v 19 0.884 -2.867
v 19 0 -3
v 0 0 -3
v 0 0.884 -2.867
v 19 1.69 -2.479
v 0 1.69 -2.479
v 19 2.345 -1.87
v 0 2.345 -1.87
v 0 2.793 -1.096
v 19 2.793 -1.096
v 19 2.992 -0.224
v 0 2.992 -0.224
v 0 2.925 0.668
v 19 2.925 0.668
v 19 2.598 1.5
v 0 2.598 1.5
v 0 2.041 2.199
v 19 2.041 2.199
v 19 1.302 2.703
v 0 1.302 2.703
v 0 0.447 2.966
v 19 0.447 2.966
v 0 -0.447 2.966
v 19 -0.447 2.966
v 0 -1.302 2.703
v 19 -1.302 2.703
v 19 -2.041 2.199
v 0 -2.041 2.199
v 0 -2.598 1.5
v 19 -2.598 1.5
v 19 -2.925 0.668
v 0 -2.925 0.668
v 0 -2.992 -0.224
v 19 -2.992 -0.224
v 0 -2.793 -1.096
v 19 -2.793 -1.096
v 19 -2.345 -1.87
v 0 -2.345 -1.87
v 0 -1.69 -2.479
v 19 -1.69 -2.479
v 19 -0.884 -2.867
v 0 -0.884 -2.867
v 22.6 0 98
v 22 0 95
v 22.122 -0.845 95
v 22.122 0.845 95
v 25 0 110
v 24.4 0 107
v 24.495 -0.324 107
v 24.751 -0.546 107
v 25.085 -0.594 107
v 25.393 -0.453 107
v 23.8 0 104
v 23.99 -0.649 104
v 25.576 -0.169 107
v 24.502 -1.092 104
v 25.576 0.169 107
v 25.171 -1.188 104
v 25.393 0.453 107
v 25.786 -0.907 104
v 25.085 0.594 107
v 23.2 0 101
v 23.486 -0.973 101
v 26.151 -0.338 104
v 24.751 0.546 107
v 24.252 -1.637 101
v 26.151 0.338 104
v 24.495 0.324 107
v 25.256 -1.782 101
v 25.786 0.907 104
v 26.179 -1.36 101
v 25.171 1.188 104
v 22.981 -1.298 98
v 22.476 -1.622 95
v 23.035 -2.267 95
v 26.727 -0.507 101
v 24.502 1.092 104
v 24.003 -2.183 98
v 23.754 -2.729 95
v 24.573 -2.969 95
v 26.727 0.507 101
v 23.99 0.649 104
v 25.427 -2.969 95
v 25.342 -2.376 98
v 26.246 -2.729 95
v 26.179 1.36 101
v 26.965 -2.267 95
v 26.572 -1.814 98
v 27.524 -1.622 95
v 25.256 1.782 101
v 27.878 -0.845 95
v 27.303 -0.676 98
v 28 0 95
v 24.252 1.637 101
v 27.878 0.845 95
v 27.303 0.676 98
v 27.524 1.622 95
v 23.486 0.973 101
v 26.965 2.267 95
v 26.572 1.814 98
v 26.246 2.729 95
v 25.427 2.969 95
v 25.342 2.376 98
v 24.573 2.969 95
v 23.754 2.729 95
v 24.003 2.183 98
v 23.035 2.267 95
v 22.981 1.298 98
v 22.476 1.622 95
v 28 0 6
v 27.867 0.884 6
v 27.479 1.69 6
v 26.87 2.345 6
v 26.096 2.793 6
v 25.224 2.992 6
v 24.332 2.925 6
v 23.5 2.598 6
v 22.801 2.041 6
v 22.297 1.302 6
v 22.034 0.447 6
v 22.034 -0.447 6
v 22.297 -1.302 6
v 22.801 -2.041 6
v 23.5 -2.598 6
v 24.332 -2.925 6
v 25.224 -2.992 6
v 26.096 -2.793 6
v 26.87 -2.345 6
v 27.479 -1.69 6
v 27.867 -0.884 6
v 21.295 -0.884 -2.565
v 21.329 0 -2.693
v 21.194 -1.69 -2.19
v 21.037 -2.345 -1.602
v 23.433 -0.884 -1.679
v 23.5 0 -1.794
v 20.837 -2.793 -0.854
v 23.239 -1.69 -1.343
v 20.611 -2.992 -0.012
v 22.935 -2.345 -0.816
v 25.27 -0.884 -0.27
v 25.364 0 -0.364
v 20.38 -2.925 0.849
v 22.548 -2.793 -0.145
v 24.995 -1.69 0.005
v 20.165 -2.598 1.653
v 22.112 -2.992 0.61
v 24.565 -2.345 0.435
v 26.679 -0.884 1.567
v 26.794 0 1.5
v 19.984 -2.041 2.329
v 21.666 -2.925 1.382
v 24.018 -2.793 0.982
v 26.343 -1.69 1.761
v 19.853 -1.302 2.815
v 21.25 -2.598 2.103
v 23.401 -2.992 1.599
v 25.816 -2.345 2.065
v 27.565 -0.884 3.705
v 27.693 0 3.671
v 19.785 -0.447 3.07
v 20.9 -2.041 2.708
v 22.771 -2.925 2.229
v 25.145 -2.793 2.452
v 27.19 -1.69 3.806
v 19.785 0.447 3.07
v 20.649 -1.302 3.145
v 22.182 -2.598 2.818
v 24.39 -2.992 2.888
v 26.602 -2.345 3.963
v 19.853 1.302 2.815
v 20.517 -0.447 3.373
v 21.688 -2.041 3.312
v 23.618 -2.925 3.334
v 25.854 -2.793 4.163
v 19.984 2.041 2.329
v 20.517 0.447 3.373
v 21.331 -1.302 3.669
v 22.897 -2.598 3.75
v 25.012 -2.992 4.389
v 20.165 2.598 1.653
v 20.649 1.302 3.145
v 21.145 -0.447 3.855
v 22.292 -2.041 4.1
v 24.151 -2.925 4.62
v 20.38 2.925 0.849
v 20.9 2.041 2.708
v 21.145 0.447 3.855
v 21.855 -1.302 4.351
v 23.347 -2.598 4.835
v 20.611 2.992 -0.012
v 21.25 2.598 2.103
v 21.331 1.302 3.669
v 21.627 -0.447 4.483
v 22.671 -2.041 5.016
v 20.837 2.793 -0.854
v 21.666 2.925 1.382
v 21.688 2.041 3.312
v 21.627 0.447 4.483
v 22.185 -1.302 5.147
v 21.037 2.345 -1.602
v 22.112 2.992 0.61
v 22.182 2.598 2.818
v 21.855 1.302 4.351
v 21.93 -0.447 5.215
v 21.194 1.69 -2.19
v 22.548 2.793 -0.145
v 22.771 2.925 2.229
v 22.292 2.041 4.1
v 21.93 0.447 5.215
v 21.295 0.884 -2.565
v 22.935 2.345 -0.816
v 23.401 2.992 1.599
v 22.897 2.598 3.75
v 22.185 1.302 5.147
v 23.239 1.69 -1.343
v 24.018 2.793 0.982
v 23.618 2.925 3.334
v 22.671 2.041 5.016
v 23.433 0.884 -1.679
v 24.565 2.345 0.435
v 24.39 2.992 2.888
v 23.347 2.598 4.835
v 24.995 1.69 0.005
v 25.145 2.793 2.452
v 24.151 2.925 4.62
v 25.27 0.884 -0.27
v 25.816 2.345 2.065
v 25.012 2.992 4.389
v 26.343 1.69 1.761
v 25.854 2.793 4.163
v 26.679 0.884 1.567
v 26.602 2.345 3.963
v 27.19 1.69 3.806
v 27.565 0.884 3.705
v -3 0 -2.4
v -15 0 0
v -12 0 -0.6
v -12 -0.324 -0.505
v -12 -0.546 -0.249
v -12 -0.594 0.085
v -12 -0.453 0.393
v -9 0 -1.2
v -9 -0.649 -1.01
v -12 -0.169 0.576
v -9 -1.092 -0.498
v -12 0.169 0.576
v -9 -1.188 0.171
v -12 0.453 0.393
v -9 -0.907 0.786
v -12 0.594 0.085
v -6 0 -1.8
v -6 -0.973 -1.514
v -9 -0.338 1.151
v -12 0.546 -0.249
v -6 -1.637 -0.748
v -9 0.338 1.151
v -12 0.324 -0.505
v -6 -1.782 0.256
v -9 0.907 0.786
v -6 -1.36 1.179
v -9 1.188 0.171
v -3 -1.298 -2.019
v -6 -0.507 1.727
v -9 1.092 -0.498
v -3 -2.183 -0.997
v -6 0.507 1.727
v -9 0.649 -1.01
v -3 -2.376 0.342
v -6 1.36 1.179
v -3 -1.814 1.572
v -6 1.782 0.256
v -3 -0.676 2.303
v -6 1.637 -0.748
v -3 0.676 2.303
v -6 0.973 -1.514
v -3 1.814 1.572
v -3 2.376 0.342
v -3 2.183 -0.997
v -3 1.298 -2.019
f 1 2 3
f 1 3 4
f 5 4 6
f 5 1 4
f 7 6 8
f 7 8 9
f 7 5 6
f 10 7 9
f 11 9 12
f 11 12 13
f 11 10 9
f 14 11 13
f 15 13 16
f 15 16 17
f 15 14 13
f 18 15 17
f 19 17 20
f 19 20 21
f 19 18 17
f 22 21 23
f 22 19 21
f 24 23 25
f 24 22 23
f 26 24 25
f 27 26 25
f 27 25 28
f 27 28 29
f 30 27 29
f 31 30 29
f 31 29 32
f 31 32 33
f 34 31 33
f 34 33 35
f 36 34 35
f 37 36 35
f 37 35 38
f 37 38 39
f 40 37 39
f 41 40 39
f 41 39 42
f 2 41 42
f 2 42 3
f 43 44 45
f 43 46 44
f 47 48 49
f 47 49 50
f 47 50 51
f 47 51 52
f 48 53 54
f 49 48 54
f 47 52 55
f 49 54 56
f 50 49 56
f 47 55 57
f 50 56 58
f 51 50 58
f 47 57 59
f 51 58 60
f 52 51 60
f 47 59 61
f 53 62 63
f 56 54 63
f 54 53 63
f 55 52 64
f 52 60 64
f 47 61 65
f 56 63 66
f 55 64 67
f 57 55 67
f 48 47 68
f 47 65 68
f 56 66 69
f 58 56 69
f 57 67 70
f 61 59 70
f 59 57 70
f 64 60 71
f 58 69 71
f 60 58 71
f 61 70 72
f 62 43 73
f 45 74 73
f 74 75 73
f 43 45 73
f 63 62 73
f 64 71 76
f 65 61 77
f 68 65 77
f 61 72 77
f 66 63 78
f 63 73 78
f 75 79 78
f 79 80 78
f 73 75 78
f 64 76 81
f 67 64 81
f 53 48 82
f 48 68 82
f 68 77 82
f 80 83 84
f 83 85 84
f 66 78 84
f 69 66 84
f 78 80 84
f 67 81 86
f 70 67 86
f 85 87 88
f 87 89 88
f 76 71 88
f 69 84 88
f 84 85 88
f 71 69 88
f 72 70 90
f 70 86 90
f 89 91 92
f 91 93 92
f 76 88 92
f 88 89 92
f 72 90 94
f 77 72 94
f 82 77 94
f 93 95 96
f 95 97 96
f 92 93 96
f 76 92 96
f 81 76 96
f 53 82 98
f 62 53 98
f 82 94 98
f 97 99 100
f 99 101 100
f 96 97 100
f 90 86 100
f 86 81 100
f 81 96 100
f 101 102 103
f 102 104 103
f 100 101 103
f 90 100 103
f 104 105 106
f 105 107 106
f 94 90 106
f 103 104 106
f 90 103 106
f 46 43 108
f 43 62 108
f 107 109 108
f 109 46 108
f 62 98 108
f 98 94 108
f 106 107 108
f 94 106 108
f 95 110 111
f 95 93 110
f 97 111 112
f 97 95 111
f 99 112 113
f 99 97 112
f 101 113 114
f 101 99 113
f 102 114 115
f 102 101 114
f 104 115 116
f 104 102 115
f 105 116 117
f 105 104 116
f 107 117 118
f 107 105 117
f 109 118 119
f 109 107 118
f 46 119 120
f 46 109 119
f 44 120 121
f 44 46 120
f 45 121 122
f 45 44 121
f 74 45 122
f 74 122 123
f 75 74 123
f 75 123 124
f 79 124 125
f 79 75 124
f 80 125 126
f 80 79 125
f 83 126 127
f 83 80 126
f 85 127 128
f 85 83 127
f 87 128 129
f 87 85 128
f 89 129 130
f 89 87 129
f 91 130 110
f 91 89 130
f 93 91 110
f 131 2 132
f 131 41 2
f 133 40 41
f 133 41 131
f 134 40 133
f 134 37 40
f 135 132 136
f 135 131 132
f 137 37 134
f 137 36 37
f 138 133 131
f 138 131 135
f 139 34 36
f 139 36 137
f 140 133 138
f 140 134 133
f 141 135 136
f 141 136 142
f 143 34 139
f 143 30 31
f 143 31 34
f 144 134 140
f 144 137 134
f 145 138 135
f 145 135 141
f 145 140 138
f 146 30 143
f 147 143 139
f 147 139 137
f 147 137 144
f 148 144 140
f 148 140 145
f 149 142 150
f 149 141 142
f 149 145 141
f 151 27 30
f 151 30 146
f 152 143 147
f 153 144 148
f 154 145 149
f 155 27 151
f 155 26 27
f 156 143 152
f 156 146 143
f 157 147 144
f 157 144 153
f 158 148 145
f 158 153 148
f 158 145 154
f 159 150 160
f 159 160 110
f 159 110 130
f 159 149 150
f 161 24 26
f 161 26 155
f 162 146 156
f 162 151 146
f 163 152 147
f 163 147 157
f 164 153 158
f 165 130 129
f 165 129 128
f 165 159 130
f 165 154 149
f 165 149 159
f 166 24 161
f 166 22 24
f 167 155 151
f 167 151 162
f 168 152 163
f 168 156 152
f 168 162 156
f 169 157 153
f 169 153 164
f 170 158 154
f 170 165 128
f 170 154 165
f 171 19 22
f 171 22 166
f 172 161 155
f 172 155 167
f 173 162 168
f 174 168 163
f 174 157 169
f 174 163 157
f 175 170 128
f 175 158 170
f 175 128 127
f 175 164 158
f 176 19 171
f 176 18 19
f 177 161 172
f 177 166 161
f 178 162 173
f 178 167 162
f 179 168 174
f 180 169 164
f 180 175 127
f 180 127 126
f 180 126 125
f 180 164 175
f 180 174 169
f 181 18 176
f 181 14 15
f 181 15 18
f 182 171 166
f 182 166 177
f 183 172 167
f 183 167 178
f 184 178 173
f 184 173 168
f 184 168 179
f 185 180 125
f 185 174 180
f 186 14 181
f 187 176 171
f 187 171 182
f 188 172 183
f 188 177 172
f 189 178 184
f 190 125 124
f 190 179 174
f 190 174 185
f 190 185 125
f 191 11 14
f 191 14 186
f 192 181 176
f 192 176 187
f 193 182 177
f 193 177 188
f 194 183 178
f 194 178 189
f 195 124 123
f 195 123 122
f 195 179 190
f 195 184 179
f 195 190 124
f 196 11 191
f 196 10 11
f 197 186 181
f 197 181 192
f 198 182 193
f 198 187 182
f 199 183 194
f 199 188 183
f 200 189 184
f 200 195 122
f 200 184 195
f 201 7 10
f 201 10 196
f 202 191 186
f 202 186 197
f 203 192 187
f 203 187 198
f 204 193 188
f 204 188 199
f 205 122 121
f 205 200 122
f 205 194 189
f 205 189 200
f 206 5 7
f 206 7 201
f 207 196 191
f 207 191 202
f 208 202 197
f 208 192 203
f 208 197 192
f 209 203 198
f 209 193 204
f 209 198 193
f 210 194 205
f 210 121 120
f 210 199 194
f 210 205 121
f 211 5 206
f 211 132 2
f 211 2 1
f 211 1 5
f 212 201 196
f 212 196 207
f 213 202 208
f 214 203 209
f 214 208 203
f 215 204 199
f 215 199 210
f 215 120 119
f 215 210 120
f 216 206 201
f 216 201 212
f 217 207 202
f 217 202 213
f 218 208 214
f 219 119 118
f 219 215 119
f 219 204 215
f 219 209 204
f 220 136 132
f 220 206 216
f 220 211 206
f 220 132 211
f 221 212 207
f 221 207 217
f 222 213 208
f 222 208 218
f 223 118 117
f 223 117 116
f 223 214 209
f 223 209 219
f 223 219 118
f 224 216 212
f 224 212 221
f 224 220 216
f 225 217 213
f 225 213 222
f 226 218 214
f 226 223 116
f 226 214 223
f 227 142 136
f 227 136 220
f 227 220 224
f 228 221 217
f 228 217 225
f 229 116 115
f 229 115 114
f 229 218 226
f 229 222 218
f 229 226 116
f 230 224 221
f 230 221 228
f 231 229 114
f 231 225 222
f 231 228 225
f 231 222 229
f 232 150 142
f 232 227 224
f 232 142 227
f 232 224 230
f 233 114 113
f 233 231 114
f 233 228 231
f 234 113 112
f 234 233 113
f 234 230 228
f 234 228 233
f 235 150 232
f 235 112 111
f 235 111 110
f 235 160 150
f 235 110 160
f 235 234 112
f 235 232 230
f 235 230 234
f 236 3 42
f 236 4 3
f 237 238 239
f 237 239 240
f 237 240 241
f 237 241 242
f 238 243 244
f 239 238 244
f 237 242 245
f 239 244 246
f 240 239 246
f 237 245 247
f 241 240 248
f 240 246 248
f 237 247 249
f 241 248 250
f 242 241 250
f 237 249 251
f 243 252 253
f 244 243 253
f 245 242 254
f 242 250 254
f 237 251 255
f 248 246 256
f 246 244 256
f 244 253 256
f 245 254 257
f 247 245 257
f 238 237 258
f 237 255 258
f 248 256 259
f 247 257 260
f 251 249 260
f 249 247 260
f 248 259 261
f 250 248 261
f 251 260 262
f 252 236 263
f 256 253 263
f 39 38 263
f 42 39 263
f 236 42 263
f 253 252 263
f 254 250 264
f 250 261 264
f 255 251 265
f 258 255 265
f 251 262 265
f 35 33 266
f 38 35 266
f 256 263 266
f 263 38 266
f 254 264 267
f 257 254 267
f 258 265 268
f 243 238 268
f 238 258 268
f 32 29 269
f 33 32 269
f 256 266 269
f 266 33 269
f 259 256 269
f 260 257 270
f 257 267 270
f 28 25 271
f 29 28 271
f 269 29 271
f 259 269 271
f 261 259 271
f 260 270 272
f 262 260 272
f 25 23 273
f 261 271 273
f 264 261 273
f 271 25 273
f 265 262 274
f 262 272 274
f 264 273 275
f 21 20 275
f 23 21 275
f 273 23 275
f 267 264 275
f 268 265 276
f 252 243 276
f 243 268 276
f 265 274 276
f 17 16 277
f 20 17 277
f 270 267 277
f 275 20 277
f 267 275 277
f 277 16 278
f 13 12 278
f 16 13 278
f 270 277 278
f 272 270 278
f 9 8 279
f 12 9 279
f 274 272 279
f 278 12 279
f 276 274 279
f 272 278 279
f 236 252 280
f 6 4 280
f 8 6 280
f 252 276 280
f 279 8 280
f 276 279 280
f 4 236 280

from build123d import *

# Parameters (mm, degrees)
SKETCH2_R = 3


with BuildPart() as part:
    # Sweep1: sweep along a path in Sketch1
    with BuildLine(Plane(origin=(0, 0, 0), x_dir=(1, 0, 0), z_dir=(0, 1, 0))) as sweep1_path:
        Line((0, 0), (19, 0))
        ThreePointArc((19, 0), (23.242640687, -1.757359313), (25, -6))
        Line((25, -6), (25, -95))
    # Sketch2 → Sweep1 (sweep)
    with BuildSketch(Plane(origin=(0, 0, 0), x_dir=(0, 0, -1), z_dir=(1, 0, 0))):
        Circle(SKETCH2_R)
    sweep(path=sweep1_path.line)

    # Sketch3 → Revolve1 (revolve)
    with BuildSketch(Plane(origin=(0, 0, 0), x_dir=(1, 0, 0), z_dir=(0, 1, 0)), mode=Mode.PRIVATE) as revolve1_sk:
        Polygon((0, 0), (-15, 0), (0, -3), align=None)
    revolve(revolve1_sk.sketch.rotate(Axis((0, 0, 0), (-1, 0, 0)), 180), axis=Axis((0, 0, 0), (-1, 0, 0)))

    # Sketch4 → Revolve2 (revolve)
    with BuildSketch(Plane(origin=(0, 0, 0), x_dir=(1, 0, 0), z_dir=(0, 1, 0)), mode=Mode.PRIVATE) as revolve2_sk:
        Polygon((25, -95), (25, -110), (28, -95), align=None)
    revolve(revolve2_sk.sketch.rotate(Axis((25, 0, 95), (0, 0, 1)), 180), axis=Axis((25, 0, 95), (0, 0, 1)))


solid = part.part
